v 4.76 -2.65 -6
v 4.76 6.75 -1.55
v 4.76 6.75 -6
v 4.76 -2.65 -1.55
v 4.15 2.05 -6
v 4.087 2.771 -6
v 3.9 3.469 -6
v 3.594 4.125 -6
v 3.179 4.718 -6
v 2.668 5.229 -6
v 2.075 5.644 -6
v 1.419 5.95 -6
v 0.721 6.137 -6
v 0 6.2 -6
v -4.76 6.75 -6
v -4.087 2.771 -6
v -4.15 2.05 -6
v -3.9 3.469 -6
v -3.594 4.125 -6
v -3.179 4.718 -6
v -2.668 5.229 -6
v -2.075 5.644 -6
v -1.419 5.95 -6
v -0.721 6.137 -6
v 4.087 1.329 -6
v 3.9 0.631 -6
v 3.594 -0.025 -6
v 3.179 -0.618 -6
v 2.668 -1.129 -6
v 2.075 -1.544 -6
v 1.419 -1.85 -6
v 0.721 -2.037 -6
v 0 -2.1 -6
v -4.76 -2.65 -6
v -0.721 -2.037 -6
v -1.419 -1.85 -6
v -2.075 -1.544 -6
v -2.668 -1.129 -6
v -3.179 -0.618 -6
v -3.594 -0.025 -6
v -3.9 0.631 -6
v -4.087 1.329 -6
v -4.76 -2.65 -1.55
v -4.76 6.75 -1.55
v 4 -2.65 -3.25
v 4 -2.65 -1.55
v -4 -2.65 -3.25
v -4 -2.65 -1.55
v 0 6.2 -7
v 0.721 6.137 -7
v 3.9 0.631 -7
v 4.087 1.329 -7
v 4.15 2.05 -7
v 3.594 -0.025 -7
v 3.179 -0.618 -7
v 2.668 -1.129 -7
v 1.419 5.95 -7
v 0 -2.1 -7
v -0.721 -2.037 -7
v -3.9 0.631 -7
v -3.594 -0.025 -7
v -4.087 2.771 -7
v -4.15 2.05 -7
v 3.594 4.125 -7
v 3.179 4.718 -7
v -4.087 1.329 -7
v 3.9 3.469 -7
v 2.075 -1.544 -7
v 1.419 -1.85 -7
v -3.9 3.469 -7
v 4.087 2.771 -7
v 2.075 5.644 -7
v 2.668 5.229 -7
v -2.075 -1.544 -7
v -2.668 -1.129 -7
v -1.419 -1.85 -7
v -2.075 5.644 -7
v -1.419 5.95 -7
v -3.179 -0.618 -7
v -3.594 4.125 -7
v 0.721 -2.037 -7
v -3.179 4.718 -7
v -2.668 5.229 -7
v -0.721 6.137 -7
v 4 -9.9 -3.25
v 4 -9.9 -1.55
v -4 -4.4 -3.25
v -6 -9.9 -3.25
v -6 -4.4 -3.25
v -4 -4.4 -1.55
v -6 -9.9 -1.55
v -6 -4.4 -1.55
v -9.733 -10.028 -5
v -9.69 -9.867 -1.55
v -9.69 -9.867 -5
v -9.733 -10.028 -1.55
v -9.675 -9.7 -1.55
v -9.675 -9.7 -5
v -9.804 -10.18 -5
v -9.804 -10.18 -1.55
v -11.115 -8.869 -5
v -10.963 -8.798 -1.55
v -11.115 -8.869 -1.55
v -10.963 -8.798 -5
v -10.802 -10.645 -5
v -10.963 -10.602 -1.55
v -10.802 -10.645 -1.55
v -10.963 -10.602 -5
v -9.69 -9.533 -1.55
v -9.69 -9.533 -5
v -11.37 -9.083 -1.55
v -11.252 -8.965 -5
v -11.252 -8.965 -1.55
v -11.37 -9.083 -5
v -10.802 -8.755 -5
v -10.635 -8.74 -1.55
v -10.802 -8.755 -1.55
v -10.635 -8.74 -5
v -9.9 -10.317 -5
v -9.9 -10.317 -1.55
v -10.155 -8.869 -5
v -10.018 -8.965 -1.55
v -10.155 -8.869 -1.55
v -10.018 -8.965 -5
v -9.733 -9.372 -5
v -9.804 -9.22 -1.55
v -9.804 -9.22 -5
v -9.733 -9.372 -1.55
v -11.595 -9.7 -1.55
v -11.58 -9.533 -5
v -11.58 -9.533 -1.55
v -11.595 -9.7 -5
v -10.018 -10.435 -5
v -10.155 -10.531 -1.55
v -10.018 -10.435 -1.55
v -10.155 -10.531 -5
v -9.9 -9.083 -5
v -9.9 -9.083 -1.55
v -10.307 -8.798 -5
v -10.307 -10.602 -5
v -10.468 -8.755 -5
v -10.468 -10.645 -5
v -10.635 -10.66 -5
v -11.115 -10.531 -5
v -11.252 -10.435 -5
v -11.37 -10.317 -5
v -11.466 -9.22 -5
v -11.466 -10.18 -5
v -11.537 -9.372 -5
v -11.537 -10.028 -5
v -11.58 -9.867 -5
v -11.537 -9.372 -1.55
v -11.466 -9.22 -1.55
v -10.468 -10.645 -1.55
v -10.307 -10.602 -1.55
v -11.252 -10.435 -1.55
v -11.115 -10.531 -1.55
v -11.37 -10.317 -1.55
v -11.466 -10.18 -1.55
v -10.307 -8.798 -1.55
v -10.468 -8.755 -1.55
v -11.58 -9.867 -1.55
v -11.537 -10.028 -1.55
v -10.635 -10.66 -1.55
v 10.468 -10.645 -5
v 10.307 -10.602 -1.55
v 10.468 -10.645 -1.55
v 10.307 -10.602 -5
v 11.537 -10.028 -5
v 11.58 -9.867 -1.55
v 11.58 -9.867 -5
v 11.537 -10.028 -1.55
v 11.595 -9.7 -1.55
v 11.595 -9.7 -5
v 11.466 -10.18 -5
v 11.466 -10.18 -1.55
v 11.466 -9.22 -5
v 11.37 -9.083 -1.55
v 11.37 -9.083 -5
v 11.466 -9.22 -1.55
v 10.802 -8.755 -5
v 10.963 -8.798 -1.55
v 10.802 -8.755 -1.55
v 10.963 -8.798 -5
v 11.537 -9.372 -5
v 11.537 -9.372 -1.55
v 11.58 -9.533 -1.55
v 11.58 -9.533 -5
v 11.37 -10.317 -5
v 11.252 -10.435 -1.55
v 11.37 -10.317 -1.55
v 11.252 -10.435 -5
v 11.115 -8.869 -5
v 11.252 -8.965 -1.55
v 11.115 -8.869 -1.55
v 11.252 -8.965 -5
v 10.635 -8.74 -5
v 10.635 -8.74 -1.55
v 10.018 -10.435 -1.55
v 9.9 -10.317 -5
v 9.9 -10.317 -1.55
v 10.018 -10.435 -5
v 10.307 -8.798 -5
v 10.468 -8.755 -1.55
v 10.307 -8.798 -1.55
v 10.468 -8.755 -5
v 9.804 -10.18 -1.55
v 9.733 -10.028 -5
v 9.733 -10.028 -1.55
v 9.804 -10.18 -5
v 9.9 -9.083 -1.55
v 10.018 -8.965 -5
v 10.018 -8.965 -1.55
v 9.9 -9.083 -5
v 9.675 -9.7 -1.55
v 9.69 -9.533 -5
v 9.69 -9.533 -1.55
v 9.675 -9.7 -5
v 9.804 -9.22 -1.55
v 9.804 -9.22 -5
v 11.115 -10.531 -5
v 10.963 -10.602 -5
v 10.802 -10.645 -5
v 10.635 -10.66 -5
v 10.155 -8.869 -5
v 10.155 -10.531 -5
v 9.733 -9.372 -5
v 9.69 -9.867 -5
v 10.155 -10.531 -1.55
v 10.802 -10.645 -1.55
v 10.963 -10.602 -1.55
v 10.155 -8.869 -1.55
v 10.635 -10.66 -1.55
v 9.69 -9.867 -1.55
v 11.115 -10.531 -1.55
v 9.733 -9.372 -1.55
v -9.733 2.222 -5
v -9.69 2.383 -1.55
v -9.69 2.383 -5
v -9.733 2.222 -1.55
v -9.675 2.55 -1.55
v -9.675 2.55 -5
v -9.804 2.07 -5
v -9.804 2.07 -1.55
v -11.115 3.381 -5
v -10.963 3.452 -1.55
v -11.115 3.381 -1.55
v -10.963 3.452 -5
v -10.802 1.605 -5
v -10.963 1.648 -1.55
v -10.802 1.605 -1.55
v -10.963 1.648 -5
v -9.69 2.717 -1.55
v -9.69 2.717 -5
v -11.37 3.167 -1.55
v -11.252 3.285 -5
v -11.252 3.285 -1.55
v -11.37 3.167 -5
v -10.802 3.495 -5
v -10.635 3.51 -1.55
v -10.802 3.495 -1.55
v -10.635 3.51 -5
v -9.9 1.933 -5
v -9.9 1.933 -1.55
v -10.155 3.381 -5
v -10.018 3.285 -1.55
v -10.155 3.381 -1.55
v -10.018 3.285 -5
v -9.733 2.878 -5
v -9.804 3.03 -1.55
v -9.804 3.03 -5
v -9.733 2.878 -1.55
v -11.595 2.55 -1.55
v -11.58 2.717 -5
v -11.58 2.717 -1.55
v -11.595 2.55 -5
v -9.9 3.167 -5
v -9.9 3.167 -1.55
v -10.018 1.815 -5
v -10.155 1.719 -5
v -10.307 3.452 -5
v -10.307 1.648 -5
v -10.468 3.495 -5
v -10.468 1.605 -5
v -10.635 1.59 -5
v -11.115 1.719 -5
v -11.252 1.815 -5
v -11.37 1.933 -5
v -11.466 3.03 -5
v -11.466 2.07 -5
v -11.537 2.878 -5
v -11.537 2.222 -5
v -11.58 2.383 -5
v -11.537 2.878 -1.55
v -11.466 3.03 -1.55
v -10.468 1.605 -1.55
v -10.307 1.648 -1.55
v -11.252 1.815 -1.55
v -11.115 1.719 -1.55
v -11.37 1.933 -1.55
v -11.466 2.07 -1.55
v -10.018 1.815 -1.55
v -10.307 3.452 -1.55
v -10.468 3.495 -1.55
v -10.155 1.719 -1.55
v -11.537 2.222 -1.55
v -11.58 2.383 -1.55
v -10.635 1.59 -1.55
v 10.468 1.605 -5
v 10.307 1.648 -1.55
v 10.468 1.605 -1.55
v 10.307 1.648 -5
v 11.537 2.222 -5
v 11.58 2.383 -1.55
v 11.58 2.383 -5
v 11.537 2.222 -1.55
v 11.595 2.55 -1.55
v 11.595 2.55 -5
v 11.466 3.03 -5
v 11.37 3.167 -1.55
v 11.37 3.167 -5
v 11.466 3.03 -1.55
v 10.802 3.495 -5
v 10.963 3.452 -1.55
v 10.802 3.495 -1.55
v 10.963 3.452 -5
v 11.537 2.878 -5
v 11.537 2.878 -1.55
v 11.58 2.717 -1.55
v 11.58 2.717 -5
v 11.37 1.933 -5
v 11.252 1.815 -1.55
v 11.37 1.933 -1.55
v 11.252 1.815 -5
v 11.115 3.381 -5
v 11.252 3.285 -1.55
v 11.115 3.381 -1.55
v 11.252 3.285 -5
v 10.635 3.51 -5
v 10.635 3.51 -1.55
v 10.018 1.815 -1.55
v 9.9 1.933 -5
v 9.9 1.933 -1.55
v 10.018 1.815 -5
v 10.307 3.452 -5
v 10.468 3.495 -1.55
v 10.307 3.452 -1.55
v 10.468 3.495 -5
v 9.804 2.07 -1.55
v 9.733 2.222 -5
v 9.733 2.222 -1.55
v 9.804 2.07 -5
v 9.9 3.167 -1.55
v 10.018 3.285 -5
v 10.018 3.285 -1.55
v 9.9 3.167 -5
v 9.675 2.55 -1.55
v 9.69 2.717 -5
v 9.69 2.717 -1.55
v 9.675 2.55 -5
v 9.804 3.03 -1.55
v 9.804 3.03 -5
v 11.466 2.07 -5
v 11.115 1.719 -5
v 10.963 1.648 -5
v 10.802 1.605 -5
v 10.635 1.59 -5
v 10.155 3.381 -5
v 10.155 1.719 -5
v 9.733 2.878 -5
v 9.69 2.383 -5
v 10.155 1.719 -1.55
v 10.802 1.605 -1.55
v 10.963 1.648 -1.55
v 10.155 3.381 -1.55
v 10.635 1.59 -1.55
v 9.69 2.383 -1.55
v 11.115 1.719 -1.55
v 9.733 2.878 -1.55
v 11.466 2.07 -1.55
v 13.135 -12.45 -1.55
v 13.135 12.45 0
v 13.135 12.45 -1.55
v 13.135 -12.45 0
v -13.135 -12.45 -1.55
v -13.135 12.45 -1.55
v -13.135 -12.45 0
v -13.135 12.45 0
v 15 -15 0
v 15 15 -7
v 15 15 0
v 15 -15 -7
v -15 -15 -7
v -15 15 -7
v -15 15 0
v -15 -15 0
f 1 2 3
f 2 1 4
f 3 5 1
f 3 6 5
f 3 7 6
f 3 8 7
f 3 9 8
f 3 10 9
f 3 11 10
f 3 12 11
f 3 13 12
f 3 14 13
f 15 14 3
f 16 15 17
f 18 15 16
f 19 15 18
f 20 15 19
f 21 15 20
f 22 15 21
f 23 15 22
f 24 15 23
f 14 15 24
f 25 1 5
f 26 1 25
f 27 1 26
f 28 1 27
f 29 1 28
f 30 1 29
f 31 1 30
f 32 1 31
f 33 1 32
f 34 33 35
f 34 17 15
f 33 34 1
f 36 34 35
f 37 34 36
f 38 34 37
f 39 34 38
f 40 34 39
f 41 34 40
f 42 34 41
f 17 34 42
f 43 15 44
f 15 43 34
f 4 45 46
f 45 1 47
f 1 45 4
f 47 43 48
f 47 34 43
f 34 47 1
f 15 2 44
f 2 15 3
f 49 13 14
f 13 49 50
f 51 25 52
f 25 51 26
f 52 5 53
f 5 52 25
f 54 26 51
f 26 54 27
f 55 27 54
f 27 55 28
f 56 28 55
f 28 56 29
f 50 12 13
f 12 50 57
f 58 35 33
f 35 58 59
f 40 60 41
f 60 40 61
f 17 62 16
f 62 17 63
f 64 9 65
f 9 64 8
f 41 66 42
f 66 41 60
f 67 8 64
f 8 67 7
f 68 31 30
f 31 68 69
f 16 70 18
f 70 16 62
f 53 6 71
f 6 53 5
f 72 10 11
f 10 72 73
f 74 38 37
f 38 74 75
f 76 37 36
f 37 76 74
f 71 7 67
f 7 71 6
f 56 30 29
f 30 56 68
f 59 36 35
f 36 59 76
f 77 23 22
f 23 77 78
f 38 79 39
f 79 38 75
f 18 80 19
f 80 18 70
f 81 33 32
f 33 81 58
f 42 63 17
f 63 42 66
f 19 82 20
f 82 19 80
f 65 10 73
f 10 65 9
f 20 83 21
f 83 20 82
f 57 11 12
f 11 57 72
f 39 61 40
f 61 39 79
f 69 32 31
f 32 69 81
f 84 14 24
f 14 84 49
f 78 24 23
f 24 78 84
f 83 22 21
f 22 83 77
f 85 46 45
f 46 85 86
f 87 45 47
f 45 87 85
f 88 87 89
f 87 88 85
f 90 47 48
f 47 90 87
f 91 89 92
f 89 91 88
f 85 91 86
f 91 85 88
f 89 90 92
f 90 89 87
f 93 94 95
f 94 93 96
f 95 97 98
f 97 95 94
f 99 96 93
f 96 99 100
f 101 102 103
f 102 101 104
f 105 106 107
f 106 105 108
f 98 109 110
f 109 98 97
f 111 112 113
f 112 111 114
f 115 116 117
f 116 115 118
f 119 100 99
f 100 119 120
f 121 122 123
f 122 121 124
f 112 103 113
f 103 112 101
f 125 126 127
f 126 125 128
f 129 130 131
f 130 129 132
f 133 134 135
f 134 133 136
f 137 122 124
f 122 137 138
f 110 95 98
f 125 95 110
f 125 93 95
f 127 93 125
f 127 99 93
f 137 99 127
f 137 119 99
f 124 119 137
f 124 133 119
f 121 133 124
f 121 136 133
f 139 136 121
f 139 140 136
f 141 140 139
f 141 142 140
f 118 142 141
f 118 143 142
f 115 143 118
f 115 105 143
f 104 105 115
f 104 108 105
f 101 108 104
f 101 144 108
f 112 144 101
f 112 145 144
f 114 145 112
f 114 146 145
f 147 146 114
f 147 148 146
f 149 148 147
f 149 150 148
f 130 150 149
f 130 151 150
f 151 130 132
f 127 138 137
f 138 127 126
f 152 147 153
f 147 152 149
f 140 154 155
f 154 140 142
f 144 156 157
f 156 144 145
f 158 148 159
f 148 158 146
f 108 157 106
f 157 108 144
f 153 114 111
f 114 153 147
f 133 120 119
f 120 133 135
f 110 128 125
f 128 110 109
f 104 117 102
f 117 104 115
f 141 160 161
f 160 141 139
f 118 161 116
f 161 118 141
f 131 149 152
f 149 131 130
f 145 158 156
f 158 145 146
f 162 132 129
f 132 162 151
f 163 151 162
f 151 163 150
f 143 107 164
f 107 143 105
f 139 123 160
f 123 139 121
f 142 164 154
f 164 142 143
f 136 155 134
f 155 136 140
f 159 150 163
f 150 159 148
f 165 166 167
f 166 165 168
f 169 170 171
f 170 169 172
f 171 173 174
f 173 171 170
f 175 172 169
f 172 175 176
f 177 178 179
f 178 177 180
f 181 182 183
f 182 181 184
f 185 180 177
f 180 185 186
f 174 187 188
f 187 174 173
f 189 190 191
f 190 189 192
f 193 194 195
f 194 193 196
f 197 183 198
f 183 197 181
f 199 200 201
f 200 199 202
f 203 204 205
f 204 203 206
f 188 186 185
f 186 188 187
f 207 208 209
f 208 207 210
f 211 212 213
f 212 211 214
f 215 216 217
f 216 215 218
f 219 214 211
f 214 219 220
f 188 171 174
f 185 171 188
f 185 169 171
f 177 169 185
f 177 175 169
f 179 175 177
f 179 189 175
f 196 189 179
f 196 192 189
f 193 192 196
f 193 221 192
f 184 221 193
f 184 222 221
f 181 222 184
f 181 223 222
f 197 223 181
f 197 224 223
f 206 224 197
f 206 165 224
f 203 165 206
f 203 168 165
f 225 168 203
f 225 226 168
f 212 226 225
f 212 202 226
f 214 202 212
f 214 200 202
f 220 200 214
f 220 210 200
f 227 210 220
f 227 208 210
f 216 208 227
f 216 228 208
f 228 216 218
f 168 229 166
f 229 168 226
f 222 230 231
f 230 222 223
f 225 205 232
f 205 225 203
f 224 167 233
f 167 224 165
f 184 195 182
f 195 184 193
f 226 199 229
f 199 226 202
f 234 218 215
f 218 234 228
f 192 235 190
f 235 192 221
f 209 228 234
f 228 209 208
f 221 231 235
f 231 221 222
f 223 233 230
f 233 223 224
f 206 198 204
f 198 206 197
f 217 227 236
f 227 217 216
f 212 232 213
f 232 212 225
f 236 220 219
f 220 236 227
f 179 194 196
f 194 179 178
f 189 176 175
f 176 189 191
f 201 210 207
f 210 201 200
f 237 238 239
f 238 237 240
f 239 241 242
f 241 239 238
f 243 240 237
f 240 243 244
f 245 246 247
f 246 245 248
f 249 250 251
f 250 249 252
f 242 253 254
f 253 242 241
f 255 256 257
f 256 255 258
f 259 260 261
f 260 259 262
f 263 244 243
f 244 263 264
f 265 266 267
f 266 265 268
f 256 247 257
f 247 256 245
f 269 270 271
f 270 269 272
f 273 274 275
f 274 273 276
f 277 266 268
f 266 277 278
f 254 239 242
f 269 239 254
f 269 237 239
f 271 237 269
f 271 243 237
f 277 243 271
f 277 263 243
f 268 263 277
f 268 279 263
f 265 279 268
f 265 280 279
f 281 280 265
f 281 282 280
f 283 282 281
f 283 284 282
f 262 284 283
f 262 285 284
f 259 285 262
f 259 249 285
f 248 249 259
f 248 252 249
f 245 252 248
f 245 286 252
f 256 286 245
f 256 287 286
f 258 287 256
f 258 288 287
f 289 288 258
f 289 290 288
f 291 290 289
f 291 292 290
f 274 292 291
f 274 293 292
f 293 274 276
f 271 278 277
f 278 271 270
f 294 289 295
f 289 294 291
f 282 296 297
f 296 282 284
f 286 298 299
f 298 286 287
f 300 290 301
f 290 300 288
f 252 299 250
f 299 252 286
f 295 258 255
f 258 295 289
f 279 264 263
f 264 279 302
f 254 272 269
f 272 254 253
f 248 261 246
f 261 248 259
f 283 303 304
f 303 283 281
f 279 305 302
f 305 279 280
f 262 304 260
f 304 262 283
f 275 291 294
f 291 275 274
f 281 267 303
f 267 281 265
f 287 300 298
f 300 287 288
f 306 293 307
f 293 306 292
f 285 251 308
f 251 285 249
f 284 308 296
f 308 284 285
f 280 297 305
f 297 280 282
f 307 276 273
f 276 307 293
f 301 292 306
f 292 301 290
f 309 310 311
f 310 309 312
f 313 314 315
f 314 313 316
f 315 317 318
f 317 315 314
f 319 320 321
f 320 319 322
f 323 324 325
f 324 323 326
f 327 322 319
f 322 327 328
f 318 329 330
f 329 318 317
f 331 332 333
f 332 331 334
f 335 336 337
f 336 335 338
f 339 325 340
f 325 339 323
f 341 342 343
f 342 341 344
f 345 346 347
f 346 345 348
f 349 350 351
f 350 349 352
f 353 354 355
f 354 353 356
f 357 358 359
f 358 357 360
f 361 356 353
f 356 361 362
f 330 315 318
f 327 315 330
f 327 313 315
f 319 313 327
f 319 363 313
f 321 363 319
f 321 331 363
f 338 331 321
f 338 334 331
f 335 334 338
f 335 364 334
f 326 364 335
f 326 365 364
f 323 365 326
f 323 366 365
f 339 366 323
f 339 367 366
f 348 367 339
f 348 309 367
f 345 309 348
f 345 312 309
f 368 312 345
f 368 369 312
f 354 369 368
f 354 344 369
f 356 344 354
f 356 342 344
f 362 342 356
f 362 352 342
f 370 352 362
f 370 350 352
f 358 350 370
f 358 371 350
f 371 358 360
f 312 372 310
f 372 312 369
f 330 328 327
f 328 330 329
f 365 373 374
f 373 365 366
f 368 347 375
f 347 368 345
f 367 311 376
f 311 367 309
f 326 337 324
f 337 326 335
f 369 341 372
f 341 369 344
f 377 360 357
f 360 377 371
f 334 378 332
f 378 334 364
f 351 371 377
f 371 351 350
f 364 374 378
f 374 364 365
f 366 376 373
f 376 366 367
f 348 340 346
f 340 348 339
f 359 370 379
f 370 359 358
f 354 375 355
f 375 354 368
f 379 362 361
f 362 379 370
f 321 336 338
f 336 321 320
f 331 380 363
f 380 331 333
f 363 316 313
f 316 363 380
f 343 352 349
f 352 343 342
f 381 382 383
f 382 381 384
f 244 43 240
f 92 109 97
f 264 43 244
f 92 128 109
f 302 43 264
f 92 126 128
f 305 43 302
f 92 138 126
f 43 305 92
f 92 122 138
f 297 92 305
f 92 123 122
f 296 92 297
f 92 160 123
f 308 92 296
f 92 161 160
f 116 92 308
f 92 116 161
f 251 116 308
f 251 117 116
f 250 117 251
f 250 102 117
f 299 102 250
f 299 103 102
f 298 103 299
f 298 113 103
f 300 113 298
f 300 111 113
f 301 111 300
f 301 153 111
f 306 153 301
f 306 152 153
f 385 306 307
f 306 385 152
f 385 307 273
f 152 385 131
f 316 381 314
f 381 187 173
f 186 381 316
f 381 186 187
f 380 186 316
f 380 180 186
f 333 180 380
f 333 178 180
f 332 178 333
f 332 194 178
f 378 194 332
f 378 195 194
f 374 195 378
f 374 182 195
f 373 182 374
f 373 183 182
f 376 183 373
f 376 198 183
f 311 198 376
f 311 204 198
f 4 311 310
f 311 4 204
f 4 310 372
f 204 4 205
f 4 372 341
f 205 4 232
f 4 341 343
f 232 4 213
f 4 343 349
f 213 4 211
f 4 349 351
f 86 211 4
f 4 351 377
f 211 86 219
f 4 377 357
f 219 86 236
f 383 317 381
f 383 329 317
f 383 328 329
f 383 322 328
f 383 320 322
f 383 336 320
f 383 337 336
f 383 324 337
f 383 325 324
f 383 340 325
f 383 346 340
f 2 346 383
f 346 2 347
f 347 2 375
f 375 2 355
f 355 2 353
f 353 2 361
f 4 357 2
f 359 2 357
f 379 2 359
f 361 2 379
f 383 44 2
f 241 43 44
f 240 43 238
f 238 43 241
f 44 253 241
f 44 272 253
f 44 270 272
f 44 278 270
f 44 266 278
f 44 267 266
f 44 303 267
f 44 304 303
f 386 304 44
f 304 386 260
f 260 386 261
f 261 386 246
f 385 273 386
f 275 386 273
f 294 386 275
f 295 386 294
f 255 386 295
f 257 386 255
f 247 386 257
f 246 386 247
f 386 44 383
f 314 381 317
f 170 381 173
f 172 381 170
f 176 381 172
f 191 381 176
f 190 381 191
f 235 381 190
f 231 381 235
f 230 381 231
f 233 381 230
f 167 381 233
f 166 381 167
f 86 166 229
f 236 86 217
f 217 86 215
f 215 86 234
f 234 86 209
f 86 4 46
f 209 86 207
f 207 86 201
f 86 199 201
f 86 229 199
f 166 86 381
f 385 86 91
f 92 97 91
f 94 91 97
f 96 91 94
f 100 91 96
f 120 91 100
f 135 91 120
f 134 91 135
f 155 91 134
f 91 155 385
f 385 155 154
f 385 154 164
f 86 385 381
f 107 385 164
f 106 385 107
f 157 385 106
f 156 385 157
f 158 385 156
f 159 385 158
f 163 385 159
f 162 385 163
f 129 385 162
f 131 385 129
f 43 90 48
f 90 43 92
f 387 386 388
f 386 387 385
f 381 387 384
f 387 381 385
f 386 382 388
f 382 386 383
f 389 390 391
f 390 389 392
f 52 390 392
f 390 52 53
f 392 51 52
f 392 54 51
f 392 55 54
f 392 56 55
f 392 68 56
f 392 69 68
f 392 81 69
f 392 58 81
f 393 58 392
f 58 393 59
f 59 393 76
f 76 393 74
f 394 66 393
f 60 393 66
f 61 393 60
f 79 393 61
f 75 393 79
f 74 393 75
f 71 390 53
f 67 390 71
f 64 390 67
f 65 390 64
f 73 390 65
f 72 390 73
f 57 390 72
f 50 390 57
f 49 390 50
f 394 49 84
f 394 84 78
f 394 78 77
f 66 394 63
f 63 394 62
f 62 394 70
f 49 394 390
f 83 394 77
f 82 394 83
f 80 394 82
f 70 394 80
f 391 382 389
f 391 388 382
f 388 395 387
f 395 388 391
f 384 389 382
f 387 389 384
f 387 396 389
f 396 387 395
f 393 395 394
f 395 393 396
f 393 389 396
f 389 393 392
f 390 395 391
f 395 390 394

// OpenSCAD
// file: RPcam2_vars.scad
//
//  A Raspberry Pi V2.1 Camera Module
//
//  Note this is for general visualization of physical fit
//  and is a simplified model.
//
//  Key variables are exposed for use in other projects.
//

//
//  Copyright (c) 2020 Sarah Kelley, sarah@sakelley.org
//
//  Permission is hereby granted, free of charge, to any person obtaining a copy
//  of this software and associated documentation files (the "Software"), to deal
//  in the Software without restriction, including without limitation the rights
//  to use, copy, modify, merge, publish, distribute, sublicense, and/or sell
//  copies of the Software, and to permit persons to whom the Software is
//  furnished to do so, subject to the following conditions:
//  
//  The above copyright notice and this permission notice shall be included in all
//  copies or substantial portions of the Software.
//  
//  THE SOFTWARE IS PROVIDED "AS IS", WITHOUT WARRANTY OF ANY KIND, EXPRESS OR
//  IMPLIED, INCLUDING BUT NOT LIMITED TO THE WARRANTIES OF MERCHANTABILITY,
//  FITNESS FOR A PARTICULAR PURPOSE AND NONINFRINGEMENT. IN NO EVENT SHALL THE
//  AUTHORS OR COPYRIGHT HOLDERS BE LIABLE FOR ANY CLAIM, DAMAGES OR OTHER
//  LIABILITY, WHETHER IN AN ACTION OF CONTRACT, TORT OR OTHERWISE, ARISING FROM,
//  OUT OF OR IN CONNECTION WITH THE SOFTWARE OR THE USE OR OTHER DEALINGS IN THE
//  SOFTWARE.
//  

// basic width of the camera board
RPcam2_width = 25.27;

// basic height of the camera board
RPcam2_height = 23.9;

// basic thickness of the camera board
RPcam2_pcbBoardThickness = 1.1;

// diameter of mounting holes plus a little extra tolerance
RPcam2_mountingHoleDiameter = 2.4;

// edge of board to center of mounting hole
RPcam2_mountingHoleToEdge = 2.0; 

// offset for upper mounting holes
RPcam2_upperHolesPos = 2.25;

// offset for lower mounting holes
RPcam2_lowerHolesPos = 14.5;

// width of the camera module on the board
RPcam2_cameraWidth = 8.52; 

// height (y) of the camera module on the board
RPcam2_cameraHeight = 8.4;

// thickness of camera module plus mounting dealie
RPcam2_cameraCubeThickness = 4.5; 

// diameter of just the round part of the camera
RPcam2_cameraDiameter = 7.3;

// thickness of just the round part of the camera module
RPcam2_cameraCylinderThickness = 2.4;

// x offset to position the camera module on the board
RPcam2_cameraXOffset = 0;

// y offset to position the camera module on the board
RPcam2_cameraYOffset = (RPcam2_height/2)-14;

// make cutout slightly bigger than the object that goes in it
RPcam2_cutoutTolerance = 1;
// main file
//
//  A Raspberry Pi V2.1 Camera Module
//
//  Note this is for general visualization of physical fit
//  and is a simplified model.
//
//  Key variables are exposed for use in other projects.
//

//
//  Copyright (c) 2020 Sarah Kelley, sarah@sakelley.org
//
//  Permission is hereby granted, free of charge, to any person obtaining a copy
//  of this software and associated documentation files (the "Software"), to deal
//  in the Software without restriction, including without limitation the rights
//  to use, copy, modify, merge, publish, distribute, sublicense, and/or sell
//  copies of the Software, and to permit persons to whom the Software is
//  furnished to do so, subject to the following conditions:
//  
//  The above copyright notice and this permission notice shall be included in all
//  copies or substantial portions of the Software.
//  
//  THE SOFTWARE IS PROVIDED "AS IS", WITHOUT WARRANTY OF ANY KIND, EXPRESS OR
//  IMPLIED, INCLUDING BUT NOT LIMITED TO THE WARRANTIES OF MERCHANTABILITY,
//  FITNESS FOR A PARTICULAR PURPOSE AND NONINFRINGEMENT. IN NO EVENT SHALL THE
//  AUTHORS OR COPYRIGHT HOLDERS BE LIABLE FOR ANY CLAIM, DAMAGES OR OTHER
//  LIABILITY, WHETHER IN AN ACTION OF CONTRACT, TORT OR OTHERWISE, ARISING FROM,
//  OUT OF OR IN CONNECTION WITH THE SOFTWARE OR THE USE OR OTHER DEALINGS IN THE
//  SOFTWARE.
//  

include <./RPcam2_vars.scad>;

module Raspberry_Pi_Camera_v21(
    width = RPcam2_width,
    height = RPcam2_height,
    pcbBoardThickness = RPcam2_pcbBoardThickness,
    pcbMaskThickness = 0.1,        // purely cosmetic in this model!
    mountingHoleDiameter = RPcam2_mountingHoleDiameter,
    mountingHoleMaskDiameter = 5,  // also cosmetic
    mountingHoleToEdge = RPcam2_mountingHoleToEdge,
    upperHolesPos = RPcam2_upperHolesPos,
    lowerHolesPos = RPcam2_lowerHolesPos,
    cameraWidth = RPcam2_cameraWidth, 
    cameraHeight = RPcam2_cameraHeight,
    cameraCubeThickness = RPcam2_cameraCubeThickness,
    cameraDiameter = RPcam2_cameraDiameter,
    cameraCylinderThickness = RPcam2_cameraCylinderThickness,
    cameraXOffset = RPcam2_cameraXOffset,
    cameraYOffset = RPcam2_cameraYOffset,
    cutout = false,
    cutoutTolerance = RPcam2_cutoutTolerance,  // make cutout slightly bigger for tolerance.
    j2Width1 = 7,
    j2Width2 = 9,
    j2Length1 = 3.5,
    j2Length2 = 4.5,
    j2Thickness = 1.5,
    depthToCutOut = 20,    // arbitrary depth when cutting hole for camera pcb
    mountingHoleDepth = 4  // whem mounting holes are cut out
    
) {
    pcbThickness = pcbBoardThickness - pcbMaskThickness;
    
    module mountingHole(side, holesPos) {
        // make holes smaller in cutout so we can thread screws into them
        mhDiam = cutout ? mountingHoleDiameter * 0.8 : mountingHoleDiameter;
        mhd = cutout ? mountingHoleDepth : pcbBoardThickness;
        mhmd = cutout ? mhDiam : mountingHoleMaskDiameter;
        translate([
                ((width/2)-mountingHoleToEdge)*side,
                (height/2)-holesPos,
                mhd/2])
            cylinder(d=mhDiam, h=mhd, center=true);
        translate([((width/2)-mountingHoleToEdge)*side,(height/2)-holesPos,
                (pcbBoardThickness/2)+(pcbMaskThickness/2)])
            cylinder(d=mhmd, h=pcbMaskThickness*2, center=true);
    }
    
    module mountingHoles() {
        leftSide = -1;
        rightSide = 1;
        mountingHole(leftSide,  upperHolesPos);
        mountingHole(rightSide, upperHolesPos);
        mountingHole(leftSide,  lowerHolesPos);
        mountingHole(rightSide, lowerHolesPos);
    }
    
    module pcb() {
        difference() {
            union() {
                // TODO: make these rounded rectangles
                color("DarkKhaki") 
                    cube([width, height, pcbBoardThickness], center=true);
                translate([0,0, (pcbBoardThickness/2) + (pcbMaskThickness/2)])
                color("LimeGreen") 
                    cube([width, height, pcbMaskThickness], center=true);
            }
            mountingHoles();
        }
    }
    
    module pcbCutout() {
        translate([0,0, (pcbBoardThickness/2)])
        translate([0,0,-(depthToCutOut/2)])
            cube([width + cutoutTolerance, 
                height + cutoutTolerance, depthToCutOut], center=true);
    }
    
    // little thingy that connects camera module to the PCB
    module j2Connector() {
        ctol = cutout ? cutoutTolerance : 0;
        j2t = cutout ? j2Thickness + pcbThickness + ctol : j2Thickness;
        color("Gray")
        translate([
                cameraXOffset,
                cameraYOffset + (cameraHeight/2) + (j2Length1/2) + ctol/2,
                //(pcbThickness/2)+(cameraCubeThickness/2) ])
                (cameraCubeThickness/2) - (j2t/2)])
            cube([j2Width1+ctol, j2Length1+ctol, j2t], center=true);
        
        color("Gray")
        translate([
                cameraXOffset - ((j2Width2+ctol)-(j2Width1+ctol))/2,
                cameraYOffset + (cameraHeight/2) + (j2Length1/2) + (j2Length2/2) 
                    + (ctol/2) + (ctol/2),
                //(pcbThickness/2)+(cameraCubeThickness/2) ])
                (cameraCubeThickness/2) - (j2t/2)])
            cube([j2Width2+ctol, j2Length2+ctol, j2t*1],center=true);
        
    }
    
    module camera(camCylThickness) {
        ctol = cutout ? cutoutTolerance : 0;
        translate([cameraXOffset,cameraYOffset,
            (pcbThickness/2)+(cameraCubeThickness/2) ])
        union() {
            color("DarkSlateGray")
                cube([cameraWidth + cutoutTolerance, 
                    cameraHeight + cutoutTolerance, 
                    cameraCubeThickness],center=true);
            translate([0,0,(cameraCubeThickness/2)+(camCylThickness/2)]) 
                color("Gray")
                    cylinder(d=cameraDiameter + ctol, h=camCylThickness + ctol, 
                        center=true);
        }
    }
        
    if (cutout) {
        union() {
            camera(camCylThickness=20);
            pcbCutout();
            j2Connector();
            mountingHoles();
        }
    } else {
        union() {
            pcb();
            camera(camCylThickness=cameraCylinderThickness);
            j2Connector();
        }
    }

}

// instantiate an example
//Raspberry_Pi_Camera_v21($fn=36);

rotate([180,0,0]) difference() {
    translate([0,0,3.5]) cube([30,30,7],center=true);
    translate([0,0,1])Raspberry_Pi_Camera_v21(cutout=true, $fn=36);
}
